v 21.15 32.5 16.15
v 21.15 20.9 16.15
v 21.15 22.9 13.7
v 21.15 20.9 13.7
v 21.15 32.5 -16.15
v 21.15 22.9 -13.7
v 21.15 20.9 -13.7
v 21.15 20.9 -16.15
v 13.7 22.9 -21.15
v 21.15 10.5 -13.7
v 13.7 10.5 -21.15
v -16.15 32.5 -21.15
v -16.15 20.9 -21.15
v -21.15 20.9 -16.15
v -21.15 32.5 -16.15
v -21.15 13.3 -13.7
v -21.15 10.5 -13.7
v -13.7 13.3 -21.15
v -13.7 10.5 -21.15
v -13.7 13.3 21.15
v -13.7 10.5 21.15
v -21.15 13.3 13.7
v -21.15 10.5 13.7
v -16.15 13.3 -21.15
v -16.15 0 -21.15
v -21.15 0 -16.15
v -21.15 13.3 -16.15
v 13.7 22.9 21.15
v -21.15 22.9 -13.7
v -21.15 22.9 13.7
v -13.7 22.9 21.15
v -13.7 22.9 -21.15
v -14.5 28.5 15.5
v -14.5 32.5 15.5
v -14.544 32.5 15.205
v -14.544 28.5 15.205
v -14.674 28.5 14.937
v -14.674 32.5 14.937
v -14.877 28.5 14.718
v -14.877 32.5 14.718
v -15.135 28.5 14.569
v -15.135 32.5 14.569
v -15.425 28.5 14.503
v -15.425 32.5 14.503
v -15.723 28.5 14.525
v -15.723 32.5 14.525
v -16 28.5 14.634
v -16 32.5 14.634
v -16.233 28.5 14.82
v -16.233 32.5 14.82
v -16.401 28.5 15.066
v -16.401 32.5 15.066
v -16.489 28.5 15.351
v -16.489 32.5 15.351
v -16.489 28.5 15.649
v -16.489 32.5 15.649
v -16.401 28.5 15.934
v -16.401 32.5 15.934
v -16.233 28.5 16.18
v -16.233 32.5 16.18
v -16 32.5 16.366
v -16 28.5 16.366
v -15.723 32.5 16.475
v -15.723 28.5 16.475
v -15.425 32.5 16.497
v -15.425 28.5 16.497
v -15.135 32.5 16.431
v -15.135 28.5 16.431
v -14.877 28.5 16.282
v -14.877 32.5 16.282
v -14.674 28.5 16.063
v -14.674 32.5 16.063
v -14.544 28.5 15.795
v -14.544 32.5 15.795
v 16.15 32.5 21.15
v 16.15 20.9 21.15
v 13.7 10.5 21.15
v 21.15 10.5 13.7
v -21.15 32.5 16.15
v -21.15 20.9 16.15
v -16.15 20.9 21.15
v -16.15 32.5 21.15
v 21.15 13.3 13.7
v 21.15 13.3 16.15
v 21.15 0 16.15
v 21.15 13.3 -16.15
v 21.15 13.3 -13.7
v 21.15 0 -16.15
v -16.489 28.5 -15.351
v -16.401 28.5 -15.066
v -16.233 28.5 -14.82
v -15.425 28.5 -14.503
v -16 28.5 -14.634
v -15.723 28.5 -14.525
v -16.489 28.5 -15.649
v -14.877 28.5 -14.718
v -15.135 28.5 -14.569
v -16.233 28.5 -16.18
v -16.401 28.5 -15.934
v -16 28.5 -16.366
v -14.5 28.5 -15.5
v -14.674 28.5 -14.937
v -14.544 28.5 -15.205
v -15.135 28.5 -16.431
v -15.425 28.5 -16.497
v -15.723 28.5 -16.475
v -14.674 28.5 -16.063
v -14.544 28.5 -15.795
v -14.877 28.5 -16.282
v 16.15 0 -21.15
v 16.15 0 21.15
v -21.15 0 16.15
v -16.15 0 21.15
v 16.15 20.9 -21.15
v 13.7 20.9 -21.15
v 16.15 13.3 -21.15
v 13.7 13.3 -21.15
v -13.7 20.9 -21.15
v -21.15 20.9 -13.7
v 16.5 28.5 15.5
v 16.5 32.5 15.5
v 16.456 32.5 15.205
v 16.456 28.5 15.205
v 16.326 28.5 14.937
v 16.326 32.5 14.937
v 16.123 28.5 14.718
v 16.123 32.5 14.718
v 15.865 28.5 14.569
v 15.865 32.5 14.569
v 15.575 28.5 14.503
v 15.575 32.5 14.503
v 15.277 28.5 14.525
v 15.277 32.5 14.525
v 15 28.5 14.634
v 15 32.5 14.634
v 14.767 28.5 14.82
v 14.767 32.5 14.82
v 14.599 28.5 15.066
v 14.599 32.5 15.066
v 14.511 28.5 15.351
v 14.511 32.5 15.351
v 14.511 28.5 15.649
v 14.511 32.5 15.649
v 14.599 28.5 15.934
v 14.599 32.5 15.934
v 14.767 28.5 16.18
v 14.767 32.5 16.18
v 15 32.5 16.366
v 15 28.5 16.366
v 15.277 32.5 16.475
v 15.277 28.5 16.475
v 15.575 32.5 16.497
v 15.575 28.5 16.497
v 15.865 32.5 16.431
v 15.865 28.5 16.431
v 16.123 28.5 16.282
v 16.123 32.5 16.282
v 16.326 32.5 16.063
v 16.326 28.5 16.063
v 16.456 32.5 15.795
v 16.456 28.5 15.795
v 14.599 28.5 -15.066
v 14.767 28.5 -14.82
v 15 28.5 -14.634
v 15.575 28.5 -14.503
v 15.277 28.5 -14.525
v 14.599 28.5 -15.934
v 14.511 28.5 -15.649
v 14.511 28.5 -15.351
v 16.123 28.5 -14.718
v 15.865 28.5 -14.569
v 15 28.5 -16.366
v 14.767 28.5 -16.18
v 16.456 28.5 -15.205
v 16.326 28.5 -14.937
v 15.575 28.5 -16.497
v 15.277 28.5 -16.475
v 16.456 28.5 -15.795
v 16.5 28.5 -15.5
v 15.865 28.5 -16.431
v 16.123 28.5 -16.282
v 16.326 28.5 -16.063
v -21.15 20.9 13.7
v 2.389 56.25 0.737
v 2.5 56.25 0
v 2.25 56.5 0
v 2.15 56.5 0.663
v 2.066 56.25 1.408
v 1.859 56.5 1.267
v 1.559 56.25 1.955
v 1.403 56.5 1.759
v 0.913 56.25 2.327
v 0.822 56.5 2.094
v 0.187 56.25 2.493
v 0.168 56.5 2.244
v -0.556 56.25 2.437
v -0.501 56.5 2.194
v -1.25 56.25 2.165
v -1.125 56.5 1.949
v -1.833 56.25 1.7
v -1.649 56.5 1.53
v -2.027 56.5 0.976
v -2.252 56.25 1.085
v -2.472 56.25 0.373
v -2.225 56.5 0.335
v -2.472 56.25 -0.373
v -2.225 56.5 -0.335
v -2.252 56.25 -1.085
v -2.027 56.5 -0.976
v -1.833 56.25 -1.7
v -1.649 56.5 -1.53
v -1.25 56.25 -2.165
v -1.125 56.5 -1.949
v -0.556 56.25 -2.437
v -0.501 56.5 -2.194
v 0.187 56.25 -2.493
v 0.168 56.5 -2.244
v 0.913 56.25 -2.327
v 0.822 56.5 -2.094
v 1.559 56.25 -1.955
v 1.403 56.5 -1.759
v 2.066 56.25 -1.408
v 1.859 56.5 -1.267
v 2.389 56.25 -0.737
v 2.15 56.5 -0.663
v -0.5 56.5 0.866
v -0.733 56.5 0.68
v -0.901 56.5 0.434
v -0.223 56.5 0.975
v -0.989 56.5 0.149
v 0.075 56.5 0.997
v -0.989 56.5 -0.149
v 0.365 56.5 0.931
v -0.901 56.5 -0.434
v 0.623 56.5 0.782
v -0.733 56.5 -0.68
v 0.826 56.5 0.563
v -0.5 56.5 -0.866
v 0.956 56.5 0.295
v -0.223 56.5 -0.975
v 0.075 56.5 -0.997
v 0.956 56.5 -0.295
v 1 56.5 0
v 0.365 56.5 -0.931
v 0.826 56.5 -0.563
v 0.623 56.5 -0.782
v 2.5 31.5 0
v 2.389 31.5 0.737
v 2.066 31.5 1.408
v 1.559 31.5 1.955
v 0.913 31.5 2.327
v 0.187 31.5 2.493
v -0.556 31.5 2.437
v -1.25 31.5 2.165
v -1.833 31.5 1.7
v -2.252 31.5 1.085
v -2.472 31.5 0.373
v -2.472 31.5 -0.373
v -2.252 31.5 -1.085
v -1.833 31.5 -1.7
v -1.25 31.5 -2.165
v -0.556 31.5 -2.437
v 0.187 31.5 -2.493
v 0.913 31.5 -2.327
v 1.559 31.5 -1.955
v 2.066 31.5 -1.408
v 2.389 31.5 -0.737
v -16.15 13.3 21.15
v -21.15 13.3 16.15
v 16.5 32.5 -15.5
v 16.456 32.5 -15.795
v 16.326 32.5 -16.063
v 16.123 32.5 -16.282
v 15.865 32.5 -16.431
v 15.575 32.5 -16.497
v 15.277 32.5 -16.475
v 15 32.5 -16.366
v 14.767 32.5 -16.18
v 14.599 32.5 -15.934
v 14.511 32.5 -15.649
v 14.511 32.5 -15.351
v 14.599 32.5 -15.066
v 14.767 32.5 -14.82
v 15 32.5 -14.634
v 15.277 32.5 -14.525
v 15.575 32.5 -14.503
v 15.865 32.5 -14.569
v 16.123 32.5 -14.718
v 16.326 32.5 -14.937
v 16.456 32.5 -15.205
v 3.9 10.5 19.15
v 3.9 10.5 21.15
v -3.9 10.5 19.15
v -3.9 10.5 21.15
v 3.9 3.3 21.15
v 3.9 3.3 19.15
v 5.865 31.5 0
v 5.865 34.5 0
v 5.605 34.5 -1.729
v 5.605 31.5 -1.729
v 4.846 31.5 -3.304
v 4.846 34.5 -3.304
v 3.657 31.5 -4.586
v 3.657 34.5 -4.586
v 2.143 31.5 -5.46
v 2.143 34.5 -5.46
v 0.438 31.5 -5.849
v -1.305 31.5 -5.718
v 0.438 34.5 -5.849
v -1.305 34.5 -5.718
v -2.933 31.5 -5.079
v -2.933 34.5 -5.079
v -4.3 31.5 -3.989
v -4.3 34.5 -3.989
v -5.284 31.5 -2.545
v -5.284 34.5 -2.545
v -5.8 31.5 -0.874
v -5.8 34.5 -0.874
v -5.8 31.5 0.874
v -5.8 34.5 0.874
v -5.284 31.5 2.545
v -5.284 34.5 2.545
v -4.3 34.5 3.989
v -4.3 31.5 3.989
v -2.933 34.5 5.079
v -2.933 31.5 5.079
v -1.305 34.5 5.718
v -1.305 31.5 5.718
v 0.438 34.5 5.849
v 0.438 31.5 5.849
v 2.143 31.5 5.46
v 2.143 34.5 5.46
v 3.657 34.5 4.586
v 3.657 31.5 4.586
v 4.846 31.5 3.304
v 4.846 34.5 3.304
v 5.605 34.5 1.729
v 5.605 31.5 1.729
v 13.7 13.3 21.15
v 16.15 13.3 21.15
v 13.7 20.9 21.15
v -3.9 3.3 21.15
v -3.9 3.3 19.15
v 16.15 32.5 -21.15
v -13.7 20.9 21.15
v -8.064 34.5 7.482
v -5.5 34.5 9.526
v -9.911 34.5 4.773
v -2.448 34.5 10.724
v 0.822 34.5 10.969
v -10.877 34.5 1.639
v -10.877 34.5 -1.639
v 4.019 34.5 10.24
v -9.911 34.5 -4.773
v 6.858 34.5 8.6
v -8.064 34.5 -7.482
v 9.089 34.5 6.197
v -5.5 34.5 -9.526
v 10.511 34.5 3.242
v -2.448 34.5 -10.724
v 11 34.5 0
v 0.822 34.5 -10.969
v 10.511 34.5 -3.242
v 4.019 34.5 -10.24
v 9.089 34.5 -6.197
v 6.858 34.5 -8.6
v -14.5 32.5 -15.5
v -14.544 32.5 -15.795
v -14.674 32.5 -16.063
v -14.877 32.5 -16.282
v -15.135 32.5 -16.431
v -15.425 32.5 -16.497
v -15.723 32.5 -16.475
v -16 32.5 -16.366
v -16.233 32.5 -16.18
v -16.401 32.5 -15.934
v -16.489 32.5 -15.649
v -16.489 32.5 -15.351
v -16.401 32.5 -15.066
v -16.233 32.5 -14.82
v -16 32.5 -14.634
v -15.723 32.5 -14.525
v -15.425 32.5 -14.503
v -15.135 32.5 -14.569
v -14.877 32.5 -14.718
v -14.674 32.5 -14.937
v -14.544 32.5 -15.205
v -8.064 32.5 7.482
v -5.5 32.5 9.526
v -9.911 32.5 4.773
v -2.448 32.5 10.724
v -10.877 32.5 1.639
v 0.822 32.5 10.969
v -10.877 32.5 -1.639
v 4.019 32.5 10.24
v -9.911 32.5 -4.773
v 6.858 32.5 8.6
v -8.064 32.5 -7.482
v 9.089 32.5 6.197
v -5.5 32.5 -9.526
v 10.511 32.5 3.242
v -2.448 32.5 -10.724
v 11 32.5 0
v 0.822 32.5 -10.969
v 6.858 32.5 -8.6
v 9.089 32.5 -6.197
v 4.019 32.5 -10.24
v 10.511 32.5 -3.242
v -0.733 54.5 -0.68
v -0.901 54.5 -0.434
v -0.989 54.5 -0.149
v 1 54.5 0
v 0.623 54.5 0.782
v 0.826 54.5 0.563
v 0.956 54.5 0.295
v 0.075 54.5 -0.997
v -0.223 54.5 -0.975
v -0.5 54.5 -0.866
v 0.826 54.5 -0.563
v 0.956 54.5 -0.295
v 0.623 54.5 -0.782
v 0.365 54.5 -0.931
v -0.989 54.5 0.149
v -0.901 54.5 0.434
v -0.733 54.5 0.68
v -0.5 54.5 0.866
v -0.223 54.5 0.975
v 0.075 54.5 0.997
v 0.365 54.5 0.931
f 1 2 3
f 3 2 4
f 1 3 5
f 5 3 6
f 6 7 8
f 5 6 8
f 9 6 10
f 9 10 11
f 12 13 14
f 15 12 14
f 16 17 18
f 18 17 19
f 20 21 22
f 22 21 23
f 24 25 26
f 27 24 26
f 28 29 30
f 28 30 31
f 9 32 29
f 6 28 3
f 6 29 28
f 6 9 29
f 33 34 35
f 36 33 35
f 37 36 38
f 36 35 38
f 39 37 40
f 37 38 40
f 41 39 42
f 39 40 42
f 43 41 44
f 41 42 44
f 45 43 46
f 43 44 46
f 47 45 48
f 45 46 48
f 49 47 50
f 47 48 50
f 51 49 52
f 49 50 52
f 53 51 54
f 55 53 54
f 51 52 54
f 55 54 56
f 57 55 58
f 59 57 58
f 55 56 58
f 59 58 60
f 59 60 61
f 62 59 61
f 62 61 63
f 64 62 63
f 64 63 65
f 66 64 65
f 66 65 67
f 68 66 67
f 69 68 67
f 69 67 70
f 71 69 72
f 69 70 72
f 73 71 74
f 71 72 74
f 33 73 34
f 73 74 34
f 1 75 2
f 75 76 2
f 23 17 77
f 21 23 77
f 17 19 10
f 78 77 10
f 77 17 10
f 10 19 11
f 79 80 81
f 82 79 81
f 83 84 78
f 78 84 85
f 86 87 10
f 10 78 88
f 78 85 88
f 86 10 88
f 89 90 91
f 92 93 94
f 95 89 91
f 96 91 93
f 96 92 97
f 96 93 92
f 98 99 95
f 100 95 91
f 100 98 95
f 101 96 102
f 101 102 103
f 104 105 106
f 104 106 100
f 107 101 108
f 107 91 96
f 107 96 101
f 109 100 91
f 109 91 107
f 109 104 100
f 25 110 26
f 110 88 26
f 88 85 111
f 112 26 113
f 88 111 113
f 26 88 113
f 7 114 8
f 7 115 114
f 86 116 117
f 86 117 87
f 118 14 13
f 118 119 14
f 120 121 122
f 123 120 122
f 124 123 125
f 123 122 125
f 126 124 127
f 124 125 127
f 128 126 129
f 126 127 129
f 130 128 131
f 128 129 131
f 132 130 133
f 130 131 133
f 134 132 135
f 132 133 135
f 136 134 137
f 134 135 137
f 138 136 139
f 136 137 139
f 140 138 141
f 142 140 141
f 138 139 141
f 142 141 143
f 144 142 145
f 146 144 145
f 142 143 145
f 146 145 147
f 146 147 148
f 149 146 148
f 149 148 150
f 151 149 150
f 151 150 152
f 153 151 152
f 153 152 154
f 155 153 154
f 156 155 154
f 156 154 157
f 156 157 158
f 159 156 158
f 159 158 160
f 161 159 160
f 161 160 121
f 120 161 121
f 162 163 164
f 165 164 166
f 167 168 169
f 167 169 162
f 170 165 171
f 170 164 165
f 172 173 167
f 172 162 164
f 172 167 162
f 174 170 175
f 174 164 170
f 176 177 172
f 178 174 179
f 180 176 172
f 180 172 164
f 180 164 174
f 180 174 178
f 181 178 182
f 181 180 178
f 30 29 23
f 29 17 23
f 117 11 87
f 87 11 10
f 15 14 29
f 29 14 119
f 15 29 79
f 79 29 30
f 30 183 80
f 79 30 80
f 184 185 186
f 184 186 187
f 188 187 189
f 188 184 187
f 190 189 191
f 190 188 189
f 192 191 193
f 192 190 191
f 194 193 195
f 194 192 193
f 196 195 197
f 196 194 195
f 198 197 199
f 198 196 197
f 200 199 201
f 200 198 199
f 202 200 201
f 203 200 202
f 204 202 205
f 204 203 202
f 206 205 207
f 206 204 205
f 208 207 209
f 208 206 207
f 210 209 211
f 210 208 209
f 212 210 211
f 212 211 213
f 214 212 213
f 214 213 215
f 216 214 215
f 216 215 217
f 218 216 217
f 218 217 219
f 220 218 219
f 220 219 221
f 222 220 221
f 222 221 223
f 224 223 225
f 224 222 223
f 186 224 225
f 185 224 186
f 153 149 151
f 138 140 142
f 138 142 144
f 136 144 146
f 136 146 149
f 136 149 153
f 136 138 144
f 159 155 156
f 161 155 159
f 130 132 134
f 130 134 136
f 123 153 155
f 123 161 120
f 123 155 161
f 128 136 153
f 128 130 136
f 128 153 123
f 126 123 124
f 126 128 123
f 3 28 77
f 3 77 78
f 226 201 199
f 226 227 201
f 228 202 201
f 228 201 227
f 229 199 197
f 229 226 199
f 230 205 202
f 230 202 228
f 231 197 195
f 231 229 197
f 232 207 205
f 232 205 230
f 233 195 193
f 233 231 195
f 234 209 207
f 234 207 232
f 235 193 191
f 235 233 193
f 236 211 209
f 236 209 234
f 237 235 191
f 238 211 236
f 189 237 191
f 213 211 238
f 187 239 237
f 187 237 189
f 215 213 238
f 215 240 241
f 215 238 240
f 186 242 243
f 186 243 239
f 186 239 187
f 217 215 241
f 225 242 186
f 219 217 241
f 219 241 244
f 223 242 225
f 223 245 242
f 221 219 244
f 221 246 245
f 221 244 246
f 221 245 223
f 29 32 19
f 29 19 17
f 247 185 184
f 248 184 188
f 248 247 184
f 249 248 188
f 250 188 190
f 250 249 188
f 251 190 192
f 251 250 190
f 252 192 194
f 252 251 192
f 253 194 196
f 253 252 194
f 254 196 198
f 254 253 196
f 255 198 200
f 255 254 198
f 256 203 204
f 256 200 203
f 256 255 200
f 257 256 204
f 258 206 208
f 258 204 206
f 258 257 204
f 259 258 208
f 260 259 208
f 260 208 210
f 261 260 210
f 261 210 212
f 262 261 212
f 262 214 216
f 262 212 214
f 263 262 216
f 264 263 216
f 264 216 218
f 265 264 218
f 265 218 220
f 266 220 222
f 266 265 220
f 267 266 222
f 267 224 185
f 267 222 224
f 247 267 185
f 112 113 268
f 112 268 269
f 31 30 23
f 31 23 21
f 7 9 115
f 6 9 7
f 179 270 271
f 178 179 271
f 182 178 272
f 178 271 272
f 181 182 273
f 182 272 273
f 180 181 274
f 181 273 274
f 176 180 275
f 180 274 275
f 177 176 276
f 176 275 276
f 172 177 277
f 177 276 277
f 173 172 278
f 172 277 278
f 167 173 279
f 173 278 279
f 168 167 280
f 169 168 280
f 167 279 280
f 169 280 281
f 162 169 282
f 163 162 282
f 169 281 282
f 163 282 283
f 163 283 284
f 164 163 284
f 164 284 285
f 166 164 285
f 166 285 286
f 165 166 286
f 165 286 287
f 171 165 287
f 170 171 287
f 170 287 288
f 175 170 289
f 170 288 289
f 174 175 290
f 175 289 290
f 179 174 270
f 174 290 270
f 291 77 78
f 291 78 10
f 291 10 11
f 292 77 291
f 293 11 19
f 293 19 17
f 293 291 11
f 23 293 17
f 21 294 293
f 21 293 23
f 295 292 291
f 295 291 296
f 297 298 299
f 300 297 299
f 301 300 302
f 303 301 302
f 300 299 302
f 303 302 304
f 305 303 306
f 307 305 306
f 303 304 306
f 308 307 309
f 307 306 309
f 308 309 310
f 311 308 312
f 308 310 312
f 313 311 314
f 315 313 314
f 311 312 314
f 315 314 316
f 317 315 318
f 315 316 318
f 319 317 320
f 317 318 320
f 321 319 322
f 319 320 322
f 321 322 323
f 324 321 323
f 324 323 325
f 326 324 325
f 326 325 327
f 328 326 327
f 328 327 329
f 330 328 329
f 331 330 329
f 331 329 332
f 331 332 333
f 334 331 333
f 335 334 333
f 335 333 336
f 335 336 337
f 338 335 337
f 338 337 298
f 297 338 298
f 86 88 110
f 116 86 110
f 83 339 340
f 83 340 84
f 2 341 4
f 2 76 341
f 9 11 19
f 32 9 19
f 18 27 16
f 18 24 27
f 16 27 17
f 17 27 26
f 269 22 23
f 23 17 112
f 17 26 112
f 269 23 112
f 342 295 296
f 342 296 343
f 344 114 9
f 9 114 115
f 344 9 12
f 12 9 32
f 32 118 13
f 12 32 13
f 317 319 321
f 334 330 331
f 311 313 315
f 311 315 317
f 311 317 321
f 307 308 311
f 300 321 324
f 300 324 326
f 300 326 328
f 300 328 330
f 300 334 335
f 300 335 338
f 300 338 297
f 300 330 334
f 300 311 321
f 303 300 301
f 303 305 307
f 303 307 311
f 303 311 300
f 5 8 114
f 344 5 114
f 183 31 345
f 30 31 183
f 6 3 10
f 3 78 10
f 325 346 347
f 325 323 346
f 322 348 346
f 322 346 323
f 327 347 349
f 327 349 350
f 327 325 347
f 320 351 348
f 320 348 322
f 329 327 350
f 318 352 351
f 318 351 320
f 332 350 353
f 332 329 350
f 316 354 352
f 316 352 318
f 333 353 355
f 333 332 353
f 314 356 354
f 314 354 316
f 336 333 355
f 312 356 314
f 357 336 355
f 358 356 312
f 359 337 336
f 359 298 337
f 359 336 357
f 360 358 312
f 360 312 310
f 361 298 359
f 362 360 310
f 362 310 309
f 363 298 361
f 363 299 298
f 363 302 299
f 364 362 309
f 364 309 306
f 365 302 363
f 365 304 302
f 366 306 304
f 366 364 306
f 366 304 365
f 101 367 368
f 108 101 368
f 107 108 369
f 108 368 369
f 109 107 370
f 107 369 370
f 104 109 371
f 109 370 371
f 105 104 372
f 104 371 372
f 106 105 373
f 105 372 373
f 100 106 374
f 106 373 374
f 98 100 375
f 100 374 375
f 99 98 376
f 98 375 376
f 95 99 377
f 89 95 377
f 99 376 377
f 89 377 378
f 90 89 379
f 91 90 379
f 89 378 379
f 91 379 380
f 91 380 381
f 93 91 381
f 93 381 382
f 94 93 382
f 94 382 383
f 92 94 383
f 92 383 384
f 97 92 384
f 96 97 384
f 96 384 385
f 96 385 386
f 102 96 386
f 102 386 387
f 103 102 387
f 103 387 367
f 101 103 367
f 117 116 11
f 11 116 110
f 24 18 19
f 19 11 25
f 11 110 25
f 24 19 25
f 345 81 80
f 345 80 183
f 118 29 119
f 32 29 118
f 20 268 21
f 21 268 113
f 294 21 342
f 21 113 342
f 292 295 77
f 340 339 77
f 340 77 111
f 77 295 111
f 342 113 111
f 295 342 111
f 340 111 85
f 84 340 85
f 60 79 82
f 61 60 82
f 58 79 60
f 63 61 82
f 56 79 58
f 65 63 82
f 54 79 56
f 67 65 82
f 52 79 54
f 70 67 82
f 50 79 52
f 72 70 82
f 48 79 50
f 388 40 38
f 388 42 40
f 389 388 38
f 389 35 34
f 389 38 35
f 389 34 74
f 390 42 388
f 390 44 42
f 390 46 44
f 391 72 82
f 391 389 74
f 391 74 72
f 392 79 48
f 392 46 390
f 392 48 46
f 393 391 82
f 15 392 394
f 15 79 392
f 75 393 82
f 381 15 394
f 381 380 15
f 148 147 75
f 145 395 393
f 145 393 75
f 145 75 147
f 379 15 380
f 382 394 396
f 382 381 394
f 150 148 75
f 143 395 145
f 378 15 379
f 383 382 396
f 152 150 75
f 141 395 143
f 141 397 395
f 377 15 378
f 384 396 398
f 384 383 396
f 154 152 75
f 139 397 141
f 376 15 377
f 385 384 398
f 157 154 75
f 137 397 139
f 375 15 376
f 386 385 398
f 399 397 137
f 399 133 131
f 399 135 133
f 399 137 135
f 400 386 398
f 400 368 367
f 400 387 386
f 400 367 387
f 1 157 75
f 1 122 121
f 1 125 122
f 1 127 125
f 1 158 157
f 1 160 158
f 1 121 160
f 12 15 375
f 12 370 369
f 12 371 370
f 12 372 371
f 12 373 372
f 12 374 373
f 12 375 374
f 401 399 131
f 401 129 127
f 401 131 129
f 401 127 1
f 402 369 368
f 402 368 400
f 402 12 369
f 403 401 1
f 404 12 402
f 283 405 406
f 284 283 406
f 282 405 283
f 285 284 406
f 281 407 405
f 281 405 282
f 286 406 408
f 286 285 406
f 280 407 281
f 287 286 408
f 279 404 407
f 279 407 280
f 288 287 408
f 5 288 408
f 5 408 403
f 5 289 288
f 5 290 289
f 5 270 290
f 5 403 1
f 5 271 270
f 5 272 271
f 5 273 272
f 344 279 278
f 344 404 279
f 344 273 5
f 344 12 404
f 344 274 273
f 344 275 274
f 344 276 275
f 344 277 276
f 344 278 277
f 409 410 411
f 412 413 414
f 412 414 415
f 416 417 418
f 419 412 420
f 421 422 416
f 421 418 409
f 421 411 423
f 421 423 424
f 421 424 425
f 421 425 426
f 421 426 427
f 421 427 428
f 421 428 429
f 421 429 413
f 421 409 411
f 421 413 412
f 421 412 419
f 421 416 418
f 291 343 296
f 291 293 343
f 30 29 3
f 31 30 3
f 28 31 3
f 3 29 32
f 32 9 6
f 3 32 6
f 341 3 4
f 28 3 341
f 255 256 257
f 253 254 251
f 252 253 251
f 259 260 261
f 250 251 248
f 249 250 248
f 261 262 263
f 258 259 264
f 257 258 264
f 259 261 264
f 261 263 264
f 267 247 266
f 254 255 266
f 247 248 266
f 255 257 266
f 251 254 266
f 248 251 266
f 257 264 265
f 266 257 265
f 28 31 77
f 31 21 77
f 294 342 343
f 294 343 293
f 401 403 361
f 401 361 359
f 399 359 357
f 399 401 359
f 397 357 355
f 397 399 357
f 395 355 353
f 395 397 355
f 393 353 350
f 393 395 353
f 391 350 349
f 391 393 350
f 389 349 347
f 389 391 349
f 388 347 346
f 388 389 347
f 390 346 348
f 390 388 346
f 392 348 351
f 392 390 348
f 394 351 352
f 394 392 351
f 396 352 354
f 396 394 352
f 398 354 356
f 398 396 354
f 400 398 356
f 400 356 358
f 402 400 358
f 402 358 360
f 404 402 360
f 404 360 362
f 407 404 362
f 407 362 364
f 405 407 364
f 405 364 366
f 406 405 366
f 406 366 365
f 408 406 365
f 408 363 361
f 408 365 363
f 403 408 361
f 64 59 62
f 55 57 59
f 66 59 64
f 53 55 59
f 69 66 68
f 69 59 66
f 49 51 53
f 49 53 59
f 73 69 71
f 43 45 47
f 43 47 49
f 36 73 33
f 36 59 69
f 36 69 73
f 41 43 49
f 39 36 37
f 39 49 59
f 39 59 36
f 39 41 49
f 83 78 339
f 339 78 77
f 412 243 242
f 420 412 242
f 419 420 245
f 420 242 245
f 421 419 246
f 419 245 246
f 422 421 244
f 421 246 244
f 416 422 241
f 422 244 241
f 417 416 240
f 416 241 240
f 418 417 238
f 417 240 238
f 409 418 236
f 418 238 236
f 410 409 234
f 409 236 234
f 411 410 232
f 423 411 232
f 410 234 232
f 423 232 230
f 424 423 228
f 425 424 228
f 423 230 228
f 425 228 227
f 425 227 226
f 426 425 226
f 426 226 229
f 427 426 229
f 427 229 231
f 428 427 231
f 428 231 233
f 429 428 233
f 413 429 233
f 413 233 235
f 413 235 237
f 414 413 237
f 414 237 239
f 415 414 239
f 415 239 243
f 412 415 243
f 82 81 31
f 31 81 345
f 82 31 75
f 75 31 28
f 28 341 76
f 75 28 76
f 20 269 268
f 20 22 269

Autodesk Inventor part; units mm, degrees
ref_plane "YZ Plane" through (0, 0, 0) normal (1, 0, 0) x (0, 1, 0)
ref_plane "XZ Plane" through (0, 0, 0) normal (0, 1, 0) x (-1, 0, 0)
ref_plane "XY Plane" through (0, 0, 0) normal (0, 0, 1) x (1, 0, 0)
sketch "captive_nut_mortises" plane through (0, 0, 0) normal (0, 0, 1) x (1, 0, 0)
  circle A0 centre (0, 0) radius 1.5
  line L0 (14, -2) -> (10, -2)
  line L1 (10, -2) -> (10, 2)
  line L2 (10, 2) -> (14, 2)
  line L3 (14, 2) -> (14, -2)
  line L4 (-10, -2) -> (-14, -2)
  line L5 (-14, -2) -> (-14, 2)
  line L6 (-14, 2) -> (-10, 2)
  line L7 (-10, 2) -> (-10, -2)
  line L8 (10, 0) -> (-10, 0) construction
  dimension "SCREW_HOLE_SIZE" = 3
  dimension "MORTISE_LENGTH" = 4
  dimension "MORTISE_WIDTH" = 4
  dimension "MORTISES_INTERVAL" = 20
sketch "captive_nut_tenons" plane through (0, 0, 0) normal (0, 0, 1) x (1, 0, 0)
  line L0 (-13.7959, 1.2254) -> (-9.7959, 1.2254)
  line L1 (-9.7959, 1.2254) -> (-9.7959, -2.7746)
  line L2 (-13.7959, -2.7746) -> (-13.7959, 1.2254)
  line L3 (10.2041, 1.2254) -> (14.2041, 1.2254)
  line L4 (14.2041, 1.2254) -> (14.2041, -2.7746)
  line L5 (10.2041, -2.7746) -> (10.2041, 1.2254)
  line L6 (-1.2959, -2.7746) -> (-1.2959, -10.2746)
  line L7 (-1.2959, -10.2746) -> (-2.7959, -10.2746)
  line L8 (-2.7959, -10.2746) -> (-2.7959, -13.2746)
  line L9 (-2.7959, -13.2746) -> (-1.2959, -13.2746)
  line L10 (-1.2959, -13.2746) -> (-1.2959, -14.7746)
  line L11 (-1.2959, -14.7746) -> (1.7041, -14.7746)
  line L12 (1.7041, -14.7746) -> (1.7041, -13.2746)
  line L13 (1.7041, -13.2746) -> (3.2041, -13.2746)
  line L14 (3.2041, -13.2746) -> (3.2041, -10.2746)
  line L15 (3.2041, -10.2746) -> (1.7041, -10.2746)
  line L16 (1.7041, -2.7746) -> (1.7041, -10.2746)
  line L17 (-9.7959, -2.7746) -> (-1.2959, -2.7746)
  line L18 (1.7041, -2.7746) -> (10.2041, -2.7746)
  point P0 (3.4972, 2.1027)
  dimension "TENONS_INTERVAL" = 20
  dimension "TENON_LENGTH" = 4
  dimension "TENON_WIDTH" = 4
  dimension "SCREW_SIZE" = 3
  dimension "SCREW_LENGTH" = 12
  dimension "NUT_THICKNESS" = 3
  dimension "NUT_DEPTH" = 7.5
  dimension "NUT_WIDTH" = 6
sketch "Sketch3" plane through (0, 0, 0) normal (0, 1, 0) x (-1, 0, 0)
  line L0 (16.15, 21.15) -> (-16.15, 21.15)
  line L1 (-21.15, 16.15) -> (-21.15, -16.15)
  line L2 (-16.15, -21.15) -> (16.15, -21.15)
  line L3 (21.15, -16.15) -> (21.15, 16.15)
  line L4 (26.9622, 0) -> (-36.6505, 0) construction
  line L5 (0, 25.1398) -> (0, -25.5601) construction
  line L6 (16.15, 21.15) -> (21.15, 16.15)
  line L7 (-21.15, -16.15) -> (-16.15, -21.15)
  line L8 (16.15, -21.15) -> (21.15, -16.15)
  line L9 (-16.15, 21.15) -> (-21.15, 16.15)
  point P0 (0, 0)
  point P1 (21.15, 21.15)
  point P2 (-21.15, -21.15)
  point P3 (-21.15, 21.15)
  point P4 (21.15, -21.15)
  point P5 (0, 0)
  dimension "d13" = 42.3
  dimension "d14" = 42.3
  dimension "d15" = 5
  dimension "d16" = 5
  dimension "d17" = 5
  dimension "d18" = 5
  dimension "d19" = 5
  dimension "d20" = 5
  dimension "d21" = 5
  dimension "d22" = 5
extrude "Extrusion1" add sketch "Sketch3" along normal blind 10.5
sketch "Sketch5" plane through (0, 10.5, 0) normal (0, 1, 0) x (1, 0, 0)
  line L0 (-21.15, -16.15) -> (-16.15, -21.15)
  line L1 (-21.15, -16.15) -> (-16.15, -21.15) projected
  line L2 (-16.15, -21.15) -> (-13.7, -21.15)
  line L3 (-13.7, -21.15) -> (-21.15, -13.7)
  line L4 (-21.15, -13.7) -> (-21.15, -16.15)
  line L5 (16.15, -21.15) -> (21.15, -16.15)
  line L6 (21.15, -16.15) -> (21.15, -13.7)
  line L7 (21.15, -13.7) -> (13.7, -21.15)
  line L8 (13.7, -21.15) -> (16.15, -21.15)
  line L9 (21.15, 16.15) -> (16.15, 21.15)
  line L10 (16.15, 21.15) -> (13.7, 21.15)
  line L11 (13.7, 21.15) -> (21.15, 13.7)
  line L12 (21.15, 13.7) -> (21.15, 16.15)
  line L13 (-16.15, 21.15) -> (-21.15, 16.15)
  line L14 (-21.15, 16.15) -> (-21.15, 13.7)
  line L15 (-21.15, 13.7) -> (-13.7, 21.15)
  line L16 (-13.7, 21.15) -> (-16.15, 21.15)
  point P0 (0, 0)
  dimension "d29" = 2.45
  dimension "d30" = 2.45
  dimension "d33" = 360
extrude "Extrusion2" add sketch "Sketch5" along normal blind 2.8
sketch "Sketch6" plane through (0, 10.5, 0) normal (0, 1, 0) x (1, 0, 0)
  line L0 (21.15, 13.7) -> (13.7, 21.15) projected
  line L1 (13.7, 21.15) -> (-13.7, 21.15) projected
  line L2 (-13.7, 21.15) -> (-21.15, 13.7) projected
  line L3 (-21.15, 13.7) -> (-21.15, -13.7) projected
  line L4 (-21.15, -13.7) -> (-13.7, -21.15) projected
  line L5 (-13.7, -21.15) -> (13.7, -21.15) projected
  line L6 (13.7, -21.15) -> (21.15, -13.7) projected
  line L7 (21.15, -13.7) -> (21.15, 13.7) projected
  point P0 (0, 0)
extrude "Extrusion3" add sketch "Sketch6" along normal blind 12.4 separate body
sketch "Sketch7" plane through (0, 22.9, 0) normal (0, 1, 0) x (1, 0, 0)
  line L0 (16.15, -21.15) -> (21.15, -16.15) projected
  line L1 (13.7, -21.15) -> (16.15, -21.15) projected
  line L2 (-13.7, -21.15) -> (13.7, -21.15) projected
  line L3 (-16.15, -21.15) -> (-13.7, -21.15) projected
  line L4 (-21.15, -16.15) -> (-16.15, -21.15) projected
  line L5 (-21.15, -13.7) -> (-21.15, -16.15) projected
  line L6 (-21.15, 13.7) -> (-21.15, -13.7) projected
  line L7 (-21.15, 16.15) -> (-21.15, 13.7) projected
  line L8 (-16.15, 21.15) -> (-21.15, 16.15) projected
  line L9 (13.7, 21.15) -> (-13.7, 21.15) projected
  line L10 (-13.7, 21.15) -> (-16.15, 21.15) projected
  line L11 (16.15, 21.15) -> (13.7, 21.15) projected
  line L12 (21.15, 16.15) -> (16.15, 21.15) projected
  line L13 (21.15, -13.7) -> (21.15, 13.7) projected
  line L14 (21.15, 13.7) -> (21.15, 16.15) projected
  line L15 (21.15, -16.15) -> (21.15, -13.7) projected
  point P0 (0, 0)
extrude "Extrusion4" add sketch "Sketch7" along normal blind 9.6 separate body
sketch "Sketch8" plane through (0, 22.9, 0) normal (0, -1, 0) x (1, 0, 0)
  line L0 (16.15, 21.15) -> (21.15, 16.15) projected
  line L1 (21.15, 16.15) -> (21.15, 13.7) projected
  line L2 (21.15, 13.7) -> (13.7, 21.15) projected
  line L3 (13.7, 21.15) -> (16.15, 21.15) projected
  line L4 (-21.15, 16.15) -> (-16.15, 21.15) projected
  line L5 (-16.15, 21.15) -> (-13.7, 21.15) projected
  line L6 (-13.7, 21.15) -> (-21.15, 13.7) projected
  line L7 (-21.15, 13.7) -> (-21.15, 16.15) projected
  line L8 (-16.15, -21.15) -> (-21.15, -16.15) projected
  line L9 (-21.15, -16.15) -> (-21.15, -13.7) projected
  line L10 (-21.15, -13.7) -> (-13.7, -21.15) projected
  line L11 (-13.7, -21.15) -> (-16.15, -21.15) projected
  line L12 (21.15, -16.15) -> (16.15, -21.15) projected
  line L13 (16.15, -21.15) -> (13.7, -21.15) projected
  line L14 (13.7, -21.15) -> (21.15, -13.7) projected
  line L15 (21.15, -13.7) -> (21.15, -16.15) projected
  point P0 (0, 0)
extrude "Extrusion5" add sketch "Sketch8" along normal blind 2 bodies 3
sketch "Sketch9" plane through (-16.15, 0, 21.15) normal (0, 0, 1) x (1, 0, 0)
  line L0 (32.3, 0) -> (0, 0) projected
  line L1 (12.25, 10.5) -> (20.05, 10.5)
  line L2 (20.05, 10.5) -> (20.05, 3.3)
  line L3 (20.05, 3.3) -> (12.25, 3.3)
  line L4 (12.25, 3.3) -> (12.25, 10.5)
  line L5 (2.45, 10.5) -> (29.85, 10.5) projected
  point P0 (16.15, 0)
  dimension "d43" = 7.8
  dimension "d44" = 3.9
  dimension "d45" = 7.2
extrude "Extrusion6" cut sketch "Sketch9" against normal blind 2 bodies 1
sketch "Sketch10" plane through (0, 32.5, 0) normal (0, 1, 0) x (1, 0, 0)
  circle A0 centre (15.5, 15.5) radius 1
  circle A1 centre (-15.5, 15.5) radius 1
  circle A2 centre (-15.5, -15.5) radius 1
  circle A3 centre (15.5, -15.5) radius 1
  point P0 (0, 0)
  dimension "d48" = 2
  dimension "d49" = 15.5
  dimension "d50" = 15.5
  dimension "d53" = 360
extrude "Extrusion7" cut sketch "Sketch10" against normal blind 4 bodies 3
sketch "Sketch11" plane through (0, 32.5, 0) normal (0, 1, 0) x (1, 0, 0)
  circle A0 centre (0, 0) radius 11
  dimension "d57" = 22
extrude "Extrusion8" add sketch "Sketch11" along normal blind 2 bodies 3
sketch "Sketch12" plane through (0, 34.5, 0) normal (0, 1, 0) x (1, 0, 0)
  circle A0 centre (0, 0) radius 5.8653
extrude "Extrusion9" cut sketch "Sketch12" against normal blind 3 bodies 3
sketch "Sketch13" plane through (0, 31.5, 0) normal (0, 1, 0) x (1, 0, 0)
  circle A0 centre (0, 0) radius 2.5
  dimension "d62" = 5
extrude "Extrusion10" add sketch "Sketch13" along normal blind 25 separate body
chamfer "Chamfer1" distance 0.25 angle 45 1 edges at (-2.5, 56.5, 0)
sketch "Sketch14" plane through (0, 56.5, 0) normal (0, 1, 0) x (1, 0, 0)
  circle A0 centre (0, 0) radius 1
  dimension "d68" = 2
extrude "Extrusion11" cut sketch "Sketch14" against normal blind 2 bodies 4
equation "\"d16\" = d15"
equation "\"d17\" = d15"
equation "\"d18\" = d17"
equation "\"d19\" = d15"
equation "\"d20\" = d19"
equation "\"d21\" = d15"
equation "\"d22\" = d21"
equation "\"d50\" = d49"
equation "\"NUT_DEPTH\" = SCREW_LENGTH - 1.5 * NUT_THICKNESS"
properties part number "NEMA17"
